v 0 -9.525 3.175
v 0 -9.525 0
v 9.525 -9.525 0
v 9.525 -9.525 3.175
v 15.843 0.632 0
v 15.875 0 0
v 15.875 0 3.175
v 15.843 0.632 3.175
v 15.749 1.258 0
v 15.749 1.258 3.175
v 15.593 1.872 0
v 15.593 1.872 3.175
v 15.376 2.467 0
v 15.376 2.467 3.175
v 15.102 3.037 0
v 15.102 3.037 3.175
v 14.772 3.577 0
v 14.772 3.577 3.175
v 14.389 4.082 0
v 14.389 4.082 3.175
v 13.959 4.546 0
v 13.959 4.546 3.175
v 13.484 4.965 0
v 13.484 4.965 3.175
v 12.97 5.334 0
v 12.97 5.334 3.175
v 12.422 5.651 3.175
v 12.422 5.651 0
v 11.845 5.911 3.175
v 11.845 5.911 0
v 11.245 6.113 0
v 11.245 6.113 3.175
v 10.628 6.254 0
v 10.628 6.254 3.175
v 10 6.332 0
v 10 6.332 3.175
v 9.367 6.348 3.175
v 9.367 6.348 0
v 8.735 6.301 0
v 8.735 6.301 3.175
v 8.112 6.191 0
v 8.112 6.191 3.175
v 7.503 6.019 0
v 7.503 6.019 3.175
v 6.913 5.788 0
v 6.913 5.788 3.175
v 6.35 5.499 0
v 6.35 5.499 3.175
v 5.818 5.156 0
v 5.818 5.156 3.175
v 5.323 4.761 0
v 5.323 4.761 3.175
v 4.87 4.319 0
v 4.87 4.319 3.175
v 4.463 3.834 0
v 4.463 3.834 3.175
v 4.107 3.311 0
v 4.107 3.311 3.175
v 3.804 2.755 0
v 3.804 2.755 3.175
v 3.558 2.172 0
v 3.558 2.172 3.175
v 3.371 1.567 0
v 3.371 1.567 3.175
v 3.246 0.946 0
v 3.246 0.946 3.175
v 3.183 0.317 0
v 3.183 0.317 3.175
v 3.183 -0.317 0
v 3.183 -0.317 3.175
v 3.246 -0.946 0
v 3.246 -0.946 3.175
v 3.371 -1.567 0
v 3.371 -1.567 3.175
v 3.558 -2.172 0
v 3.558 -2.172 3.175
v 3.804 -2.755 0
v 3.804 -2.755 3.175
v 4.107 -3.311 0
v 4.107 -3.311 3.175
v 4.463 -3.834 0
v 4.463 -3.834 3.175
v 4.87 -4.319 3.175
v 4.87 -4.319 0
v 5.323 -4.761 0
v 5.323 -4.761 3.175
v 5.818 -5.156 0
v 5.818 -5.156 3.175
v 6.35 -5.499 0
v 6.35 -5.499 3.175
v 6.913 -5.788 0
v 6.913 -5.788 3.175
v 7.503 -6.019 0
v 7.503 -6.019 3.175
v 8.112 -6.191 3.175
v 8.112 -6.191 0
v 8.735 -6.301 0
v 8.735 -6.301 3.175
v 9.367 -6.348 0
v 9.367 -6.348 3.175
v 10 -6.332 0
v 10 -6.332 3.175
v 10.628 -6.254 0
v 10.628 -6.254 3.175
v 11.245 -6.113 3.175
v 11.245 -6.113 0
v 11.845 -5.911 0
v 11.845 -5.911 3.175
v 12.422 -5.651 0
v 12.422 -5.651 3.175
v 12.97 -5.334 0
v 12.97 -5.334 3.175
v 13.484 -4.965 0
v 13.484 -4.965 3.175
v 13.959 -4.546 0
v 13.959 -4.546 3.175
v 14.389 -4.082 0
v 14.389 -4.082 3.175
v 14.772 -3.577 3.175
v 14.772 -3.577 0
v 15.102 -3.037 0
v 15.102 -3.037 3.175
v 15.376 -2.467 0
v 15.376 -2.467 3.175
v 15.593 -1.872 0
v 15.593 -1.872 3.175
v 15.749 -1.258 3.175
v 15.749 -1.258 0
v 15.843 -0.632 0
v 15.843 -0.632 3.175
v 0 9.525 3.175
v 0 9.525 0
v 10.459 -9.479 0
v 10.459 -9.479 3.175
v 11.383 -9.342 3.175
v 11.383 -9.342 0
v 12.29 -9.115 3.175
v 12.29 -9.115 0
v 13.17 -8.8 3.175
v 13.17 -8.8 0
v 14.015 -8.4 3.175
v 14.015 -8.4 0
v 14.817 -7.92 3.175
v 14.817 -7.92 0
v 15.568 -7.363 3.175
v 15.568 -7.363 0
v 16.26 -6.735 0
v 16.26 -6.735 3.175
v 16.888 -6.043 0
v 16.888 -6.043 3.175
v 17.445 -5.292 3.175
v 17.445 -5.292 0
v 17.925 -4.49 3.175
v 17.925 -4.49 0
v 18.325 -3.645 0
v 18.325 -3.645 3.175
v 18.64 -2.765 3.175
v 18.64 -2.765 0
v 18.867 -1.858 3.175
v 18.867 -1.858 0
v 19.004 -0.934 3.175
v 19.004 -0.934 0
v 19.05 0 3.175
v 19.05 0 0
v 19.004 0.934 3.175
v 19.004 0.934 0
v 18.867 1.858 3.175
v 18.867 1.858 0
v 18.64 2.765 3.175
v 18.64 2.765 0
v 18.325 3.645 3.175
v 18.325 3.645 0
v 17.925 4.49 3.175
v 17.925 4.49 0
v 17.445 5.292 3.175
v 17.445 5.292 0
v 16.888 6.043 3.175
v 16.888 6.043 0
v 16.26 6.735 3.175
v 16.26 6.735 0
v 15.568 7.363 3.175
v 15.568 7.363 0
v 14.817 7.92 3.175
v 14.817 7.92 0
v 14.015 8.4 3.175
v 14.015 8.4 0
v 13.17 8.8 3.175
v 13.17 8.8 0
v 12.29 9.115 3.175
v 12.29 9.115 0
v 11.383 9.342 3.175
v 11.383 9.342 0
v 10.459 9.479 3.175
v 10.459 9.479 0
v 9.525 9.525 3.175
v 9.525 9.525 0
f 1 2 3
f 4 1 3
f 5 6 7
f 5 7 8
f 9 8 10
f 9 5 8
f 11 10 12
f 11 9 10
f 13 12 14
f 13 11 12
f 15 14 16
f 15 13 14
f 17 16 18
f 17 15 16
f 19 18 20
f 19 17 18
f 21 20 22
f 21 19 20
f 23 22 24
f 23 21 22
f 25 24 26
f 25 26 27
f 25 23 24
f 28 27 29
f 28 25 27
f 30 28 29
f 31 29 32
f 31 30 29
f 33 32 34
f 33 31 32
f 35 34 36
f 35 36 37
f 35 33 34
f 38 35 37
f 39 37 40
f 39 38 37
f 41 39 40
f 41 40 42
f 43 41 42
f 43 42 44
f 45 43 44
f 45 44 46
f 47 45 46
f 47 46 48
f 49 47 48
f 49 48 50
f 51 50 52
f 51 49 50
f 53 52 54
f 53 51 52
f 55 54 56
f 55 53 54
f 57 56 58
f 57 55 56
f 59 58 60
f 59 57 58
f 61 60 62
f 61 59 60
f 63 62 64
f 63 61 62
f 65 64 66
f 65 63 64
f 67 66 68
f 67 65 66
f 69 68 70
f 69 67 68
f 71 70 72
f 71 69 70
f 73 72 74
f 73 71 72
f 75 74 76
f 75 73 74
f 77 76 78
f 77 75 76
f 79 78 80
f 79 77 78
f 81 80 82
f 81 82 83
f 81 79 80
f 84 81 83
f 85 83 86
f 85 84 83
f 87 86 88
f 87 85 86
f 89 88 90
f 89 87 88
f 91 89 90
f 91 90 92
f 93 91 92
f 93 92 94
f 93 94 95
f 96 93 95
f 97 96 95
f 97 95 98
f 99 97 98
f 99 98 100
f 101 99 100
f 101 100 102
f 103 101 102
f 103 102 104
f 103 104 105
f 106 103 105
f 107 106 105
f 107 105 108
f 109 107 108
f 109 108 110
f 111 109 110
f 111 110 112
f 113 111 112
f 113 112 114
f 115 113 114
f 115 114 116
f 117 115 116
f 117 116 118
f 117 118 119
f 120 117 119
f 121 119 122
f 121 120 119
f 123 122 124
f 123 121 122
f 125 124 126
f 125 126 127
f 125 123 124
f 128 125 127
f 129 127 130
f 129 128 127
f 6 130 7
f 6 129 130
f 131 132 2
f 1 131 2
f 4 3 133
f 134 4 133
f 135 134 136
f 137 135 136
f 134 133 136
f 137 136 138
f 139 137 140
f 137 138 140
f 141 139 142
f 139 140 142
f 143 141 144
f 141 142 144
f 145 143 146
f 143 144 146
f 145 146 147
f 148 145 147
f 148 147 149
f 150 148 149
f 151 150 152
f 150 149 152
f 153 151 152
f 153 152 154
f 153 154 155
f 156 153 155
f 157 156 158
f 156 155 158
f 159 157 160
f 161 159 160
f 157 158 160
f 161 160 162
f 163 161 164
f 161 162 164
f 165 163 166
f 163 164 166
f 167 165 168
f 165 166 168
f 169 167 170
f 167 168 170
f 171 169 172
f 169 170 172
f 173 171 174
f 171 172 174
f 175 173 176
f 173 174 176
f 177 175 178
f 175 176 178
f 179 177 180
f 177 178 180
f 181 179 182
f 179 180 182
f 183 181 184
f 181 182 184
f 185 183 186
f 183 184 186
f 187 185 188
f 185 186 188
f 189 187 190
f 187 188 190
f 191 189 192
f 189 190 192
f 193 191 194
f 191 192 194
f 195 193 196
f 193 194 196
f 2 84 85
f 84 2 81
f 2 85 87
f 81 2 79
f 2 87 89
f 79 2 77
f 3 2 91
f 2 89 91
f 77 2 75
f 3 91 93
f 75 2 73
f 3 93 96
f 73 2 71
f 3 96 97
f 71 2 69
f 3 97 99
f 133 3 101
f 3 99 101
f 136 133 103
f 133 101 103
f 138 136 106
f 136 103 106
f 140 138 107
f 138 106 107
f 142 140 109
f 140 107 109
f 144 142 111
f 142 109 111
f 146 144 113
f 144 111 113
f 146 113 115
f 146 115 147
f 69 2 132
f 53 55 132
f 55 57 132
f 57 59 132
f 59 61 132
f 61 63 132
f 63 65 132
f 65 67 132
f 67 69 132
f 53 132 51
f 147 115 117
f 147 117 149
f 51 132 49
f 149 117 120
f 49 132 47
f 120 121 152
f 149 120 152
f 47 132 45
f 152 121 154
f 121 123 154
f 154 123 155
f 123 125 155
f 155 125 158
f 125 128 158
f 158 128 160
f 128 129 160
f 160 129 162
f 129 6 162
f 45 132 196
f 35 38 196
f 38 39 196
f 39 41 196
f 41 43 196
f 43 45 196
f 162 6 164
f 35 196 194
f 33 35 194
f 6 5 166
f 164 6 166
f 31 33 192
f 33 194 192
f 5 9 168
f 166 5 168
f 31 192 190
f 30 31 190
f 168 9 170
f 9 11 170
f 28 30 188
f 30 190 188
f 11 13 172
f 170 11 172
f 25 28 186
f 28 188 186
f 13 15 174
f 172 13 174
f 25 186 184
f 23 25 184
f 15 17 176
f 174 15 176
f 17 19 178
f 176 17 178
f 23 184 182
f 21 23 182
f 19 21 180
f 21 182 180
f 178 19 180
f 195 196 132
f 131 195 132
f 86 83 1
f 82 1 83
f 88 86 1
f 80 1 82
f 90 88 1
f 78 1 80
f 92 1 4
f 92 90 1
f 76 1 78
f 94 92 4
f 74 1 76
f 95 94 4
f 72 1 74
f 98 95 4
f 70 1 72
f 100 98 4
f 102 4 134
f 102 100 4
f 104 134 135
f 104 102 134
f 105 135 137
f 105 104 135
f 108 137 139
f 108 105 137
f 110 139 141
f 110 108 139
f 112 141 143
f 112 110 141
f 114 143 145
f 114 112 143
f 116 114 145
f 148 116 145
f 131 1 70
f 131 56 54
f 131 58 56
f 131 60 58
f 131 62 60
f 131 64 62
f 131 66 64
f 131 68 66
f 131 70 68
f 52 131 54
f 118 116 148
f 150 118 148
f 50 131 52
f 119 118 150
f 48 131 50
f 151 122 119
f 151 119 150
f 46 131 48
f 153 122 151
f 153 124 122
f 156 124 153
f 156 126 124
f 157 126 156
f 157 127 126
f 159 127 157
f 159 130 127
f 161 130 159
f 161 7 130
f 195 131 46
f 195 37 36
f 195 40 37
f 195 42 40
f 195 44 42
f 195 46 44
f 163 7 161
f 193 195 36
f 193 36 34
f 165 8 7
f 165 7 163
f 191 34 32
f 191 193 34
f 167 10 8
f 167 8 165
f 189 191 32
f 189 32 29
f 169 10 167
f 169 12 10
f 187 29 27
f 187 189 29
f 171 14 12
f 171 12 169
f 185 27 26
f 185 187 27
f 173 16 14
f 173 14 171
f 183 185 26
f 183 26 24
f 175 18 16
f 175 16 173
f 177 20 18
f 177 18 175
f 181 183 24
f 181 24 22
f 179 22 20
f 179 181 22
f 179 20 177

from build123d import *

# Parameters (mm, degrees)
F0_R     = 6.35
F1_DEPTH = 3.175


with BuildPart() as f1:
    # F0 (on Top) → F1 (new body)
    with BuildSketch(Plane.XY):
        with BuildLine():
            Line((0, 9.525), (0, -9.525))
            Line((0, -9.525), (9.525, -9.525))
            ThreePointArc((9.525, -9.525), (19.05, 0), (9.525, 9.525))
            Line((9.525, 9.525), (0, 9.525))
        make_face()
        with Locations((9.525, 0)):
            Circle(F0_R, mode=Mode.SUBTRACT)
    extrude(amount=F1_DEPTH)


solid = f1.part
